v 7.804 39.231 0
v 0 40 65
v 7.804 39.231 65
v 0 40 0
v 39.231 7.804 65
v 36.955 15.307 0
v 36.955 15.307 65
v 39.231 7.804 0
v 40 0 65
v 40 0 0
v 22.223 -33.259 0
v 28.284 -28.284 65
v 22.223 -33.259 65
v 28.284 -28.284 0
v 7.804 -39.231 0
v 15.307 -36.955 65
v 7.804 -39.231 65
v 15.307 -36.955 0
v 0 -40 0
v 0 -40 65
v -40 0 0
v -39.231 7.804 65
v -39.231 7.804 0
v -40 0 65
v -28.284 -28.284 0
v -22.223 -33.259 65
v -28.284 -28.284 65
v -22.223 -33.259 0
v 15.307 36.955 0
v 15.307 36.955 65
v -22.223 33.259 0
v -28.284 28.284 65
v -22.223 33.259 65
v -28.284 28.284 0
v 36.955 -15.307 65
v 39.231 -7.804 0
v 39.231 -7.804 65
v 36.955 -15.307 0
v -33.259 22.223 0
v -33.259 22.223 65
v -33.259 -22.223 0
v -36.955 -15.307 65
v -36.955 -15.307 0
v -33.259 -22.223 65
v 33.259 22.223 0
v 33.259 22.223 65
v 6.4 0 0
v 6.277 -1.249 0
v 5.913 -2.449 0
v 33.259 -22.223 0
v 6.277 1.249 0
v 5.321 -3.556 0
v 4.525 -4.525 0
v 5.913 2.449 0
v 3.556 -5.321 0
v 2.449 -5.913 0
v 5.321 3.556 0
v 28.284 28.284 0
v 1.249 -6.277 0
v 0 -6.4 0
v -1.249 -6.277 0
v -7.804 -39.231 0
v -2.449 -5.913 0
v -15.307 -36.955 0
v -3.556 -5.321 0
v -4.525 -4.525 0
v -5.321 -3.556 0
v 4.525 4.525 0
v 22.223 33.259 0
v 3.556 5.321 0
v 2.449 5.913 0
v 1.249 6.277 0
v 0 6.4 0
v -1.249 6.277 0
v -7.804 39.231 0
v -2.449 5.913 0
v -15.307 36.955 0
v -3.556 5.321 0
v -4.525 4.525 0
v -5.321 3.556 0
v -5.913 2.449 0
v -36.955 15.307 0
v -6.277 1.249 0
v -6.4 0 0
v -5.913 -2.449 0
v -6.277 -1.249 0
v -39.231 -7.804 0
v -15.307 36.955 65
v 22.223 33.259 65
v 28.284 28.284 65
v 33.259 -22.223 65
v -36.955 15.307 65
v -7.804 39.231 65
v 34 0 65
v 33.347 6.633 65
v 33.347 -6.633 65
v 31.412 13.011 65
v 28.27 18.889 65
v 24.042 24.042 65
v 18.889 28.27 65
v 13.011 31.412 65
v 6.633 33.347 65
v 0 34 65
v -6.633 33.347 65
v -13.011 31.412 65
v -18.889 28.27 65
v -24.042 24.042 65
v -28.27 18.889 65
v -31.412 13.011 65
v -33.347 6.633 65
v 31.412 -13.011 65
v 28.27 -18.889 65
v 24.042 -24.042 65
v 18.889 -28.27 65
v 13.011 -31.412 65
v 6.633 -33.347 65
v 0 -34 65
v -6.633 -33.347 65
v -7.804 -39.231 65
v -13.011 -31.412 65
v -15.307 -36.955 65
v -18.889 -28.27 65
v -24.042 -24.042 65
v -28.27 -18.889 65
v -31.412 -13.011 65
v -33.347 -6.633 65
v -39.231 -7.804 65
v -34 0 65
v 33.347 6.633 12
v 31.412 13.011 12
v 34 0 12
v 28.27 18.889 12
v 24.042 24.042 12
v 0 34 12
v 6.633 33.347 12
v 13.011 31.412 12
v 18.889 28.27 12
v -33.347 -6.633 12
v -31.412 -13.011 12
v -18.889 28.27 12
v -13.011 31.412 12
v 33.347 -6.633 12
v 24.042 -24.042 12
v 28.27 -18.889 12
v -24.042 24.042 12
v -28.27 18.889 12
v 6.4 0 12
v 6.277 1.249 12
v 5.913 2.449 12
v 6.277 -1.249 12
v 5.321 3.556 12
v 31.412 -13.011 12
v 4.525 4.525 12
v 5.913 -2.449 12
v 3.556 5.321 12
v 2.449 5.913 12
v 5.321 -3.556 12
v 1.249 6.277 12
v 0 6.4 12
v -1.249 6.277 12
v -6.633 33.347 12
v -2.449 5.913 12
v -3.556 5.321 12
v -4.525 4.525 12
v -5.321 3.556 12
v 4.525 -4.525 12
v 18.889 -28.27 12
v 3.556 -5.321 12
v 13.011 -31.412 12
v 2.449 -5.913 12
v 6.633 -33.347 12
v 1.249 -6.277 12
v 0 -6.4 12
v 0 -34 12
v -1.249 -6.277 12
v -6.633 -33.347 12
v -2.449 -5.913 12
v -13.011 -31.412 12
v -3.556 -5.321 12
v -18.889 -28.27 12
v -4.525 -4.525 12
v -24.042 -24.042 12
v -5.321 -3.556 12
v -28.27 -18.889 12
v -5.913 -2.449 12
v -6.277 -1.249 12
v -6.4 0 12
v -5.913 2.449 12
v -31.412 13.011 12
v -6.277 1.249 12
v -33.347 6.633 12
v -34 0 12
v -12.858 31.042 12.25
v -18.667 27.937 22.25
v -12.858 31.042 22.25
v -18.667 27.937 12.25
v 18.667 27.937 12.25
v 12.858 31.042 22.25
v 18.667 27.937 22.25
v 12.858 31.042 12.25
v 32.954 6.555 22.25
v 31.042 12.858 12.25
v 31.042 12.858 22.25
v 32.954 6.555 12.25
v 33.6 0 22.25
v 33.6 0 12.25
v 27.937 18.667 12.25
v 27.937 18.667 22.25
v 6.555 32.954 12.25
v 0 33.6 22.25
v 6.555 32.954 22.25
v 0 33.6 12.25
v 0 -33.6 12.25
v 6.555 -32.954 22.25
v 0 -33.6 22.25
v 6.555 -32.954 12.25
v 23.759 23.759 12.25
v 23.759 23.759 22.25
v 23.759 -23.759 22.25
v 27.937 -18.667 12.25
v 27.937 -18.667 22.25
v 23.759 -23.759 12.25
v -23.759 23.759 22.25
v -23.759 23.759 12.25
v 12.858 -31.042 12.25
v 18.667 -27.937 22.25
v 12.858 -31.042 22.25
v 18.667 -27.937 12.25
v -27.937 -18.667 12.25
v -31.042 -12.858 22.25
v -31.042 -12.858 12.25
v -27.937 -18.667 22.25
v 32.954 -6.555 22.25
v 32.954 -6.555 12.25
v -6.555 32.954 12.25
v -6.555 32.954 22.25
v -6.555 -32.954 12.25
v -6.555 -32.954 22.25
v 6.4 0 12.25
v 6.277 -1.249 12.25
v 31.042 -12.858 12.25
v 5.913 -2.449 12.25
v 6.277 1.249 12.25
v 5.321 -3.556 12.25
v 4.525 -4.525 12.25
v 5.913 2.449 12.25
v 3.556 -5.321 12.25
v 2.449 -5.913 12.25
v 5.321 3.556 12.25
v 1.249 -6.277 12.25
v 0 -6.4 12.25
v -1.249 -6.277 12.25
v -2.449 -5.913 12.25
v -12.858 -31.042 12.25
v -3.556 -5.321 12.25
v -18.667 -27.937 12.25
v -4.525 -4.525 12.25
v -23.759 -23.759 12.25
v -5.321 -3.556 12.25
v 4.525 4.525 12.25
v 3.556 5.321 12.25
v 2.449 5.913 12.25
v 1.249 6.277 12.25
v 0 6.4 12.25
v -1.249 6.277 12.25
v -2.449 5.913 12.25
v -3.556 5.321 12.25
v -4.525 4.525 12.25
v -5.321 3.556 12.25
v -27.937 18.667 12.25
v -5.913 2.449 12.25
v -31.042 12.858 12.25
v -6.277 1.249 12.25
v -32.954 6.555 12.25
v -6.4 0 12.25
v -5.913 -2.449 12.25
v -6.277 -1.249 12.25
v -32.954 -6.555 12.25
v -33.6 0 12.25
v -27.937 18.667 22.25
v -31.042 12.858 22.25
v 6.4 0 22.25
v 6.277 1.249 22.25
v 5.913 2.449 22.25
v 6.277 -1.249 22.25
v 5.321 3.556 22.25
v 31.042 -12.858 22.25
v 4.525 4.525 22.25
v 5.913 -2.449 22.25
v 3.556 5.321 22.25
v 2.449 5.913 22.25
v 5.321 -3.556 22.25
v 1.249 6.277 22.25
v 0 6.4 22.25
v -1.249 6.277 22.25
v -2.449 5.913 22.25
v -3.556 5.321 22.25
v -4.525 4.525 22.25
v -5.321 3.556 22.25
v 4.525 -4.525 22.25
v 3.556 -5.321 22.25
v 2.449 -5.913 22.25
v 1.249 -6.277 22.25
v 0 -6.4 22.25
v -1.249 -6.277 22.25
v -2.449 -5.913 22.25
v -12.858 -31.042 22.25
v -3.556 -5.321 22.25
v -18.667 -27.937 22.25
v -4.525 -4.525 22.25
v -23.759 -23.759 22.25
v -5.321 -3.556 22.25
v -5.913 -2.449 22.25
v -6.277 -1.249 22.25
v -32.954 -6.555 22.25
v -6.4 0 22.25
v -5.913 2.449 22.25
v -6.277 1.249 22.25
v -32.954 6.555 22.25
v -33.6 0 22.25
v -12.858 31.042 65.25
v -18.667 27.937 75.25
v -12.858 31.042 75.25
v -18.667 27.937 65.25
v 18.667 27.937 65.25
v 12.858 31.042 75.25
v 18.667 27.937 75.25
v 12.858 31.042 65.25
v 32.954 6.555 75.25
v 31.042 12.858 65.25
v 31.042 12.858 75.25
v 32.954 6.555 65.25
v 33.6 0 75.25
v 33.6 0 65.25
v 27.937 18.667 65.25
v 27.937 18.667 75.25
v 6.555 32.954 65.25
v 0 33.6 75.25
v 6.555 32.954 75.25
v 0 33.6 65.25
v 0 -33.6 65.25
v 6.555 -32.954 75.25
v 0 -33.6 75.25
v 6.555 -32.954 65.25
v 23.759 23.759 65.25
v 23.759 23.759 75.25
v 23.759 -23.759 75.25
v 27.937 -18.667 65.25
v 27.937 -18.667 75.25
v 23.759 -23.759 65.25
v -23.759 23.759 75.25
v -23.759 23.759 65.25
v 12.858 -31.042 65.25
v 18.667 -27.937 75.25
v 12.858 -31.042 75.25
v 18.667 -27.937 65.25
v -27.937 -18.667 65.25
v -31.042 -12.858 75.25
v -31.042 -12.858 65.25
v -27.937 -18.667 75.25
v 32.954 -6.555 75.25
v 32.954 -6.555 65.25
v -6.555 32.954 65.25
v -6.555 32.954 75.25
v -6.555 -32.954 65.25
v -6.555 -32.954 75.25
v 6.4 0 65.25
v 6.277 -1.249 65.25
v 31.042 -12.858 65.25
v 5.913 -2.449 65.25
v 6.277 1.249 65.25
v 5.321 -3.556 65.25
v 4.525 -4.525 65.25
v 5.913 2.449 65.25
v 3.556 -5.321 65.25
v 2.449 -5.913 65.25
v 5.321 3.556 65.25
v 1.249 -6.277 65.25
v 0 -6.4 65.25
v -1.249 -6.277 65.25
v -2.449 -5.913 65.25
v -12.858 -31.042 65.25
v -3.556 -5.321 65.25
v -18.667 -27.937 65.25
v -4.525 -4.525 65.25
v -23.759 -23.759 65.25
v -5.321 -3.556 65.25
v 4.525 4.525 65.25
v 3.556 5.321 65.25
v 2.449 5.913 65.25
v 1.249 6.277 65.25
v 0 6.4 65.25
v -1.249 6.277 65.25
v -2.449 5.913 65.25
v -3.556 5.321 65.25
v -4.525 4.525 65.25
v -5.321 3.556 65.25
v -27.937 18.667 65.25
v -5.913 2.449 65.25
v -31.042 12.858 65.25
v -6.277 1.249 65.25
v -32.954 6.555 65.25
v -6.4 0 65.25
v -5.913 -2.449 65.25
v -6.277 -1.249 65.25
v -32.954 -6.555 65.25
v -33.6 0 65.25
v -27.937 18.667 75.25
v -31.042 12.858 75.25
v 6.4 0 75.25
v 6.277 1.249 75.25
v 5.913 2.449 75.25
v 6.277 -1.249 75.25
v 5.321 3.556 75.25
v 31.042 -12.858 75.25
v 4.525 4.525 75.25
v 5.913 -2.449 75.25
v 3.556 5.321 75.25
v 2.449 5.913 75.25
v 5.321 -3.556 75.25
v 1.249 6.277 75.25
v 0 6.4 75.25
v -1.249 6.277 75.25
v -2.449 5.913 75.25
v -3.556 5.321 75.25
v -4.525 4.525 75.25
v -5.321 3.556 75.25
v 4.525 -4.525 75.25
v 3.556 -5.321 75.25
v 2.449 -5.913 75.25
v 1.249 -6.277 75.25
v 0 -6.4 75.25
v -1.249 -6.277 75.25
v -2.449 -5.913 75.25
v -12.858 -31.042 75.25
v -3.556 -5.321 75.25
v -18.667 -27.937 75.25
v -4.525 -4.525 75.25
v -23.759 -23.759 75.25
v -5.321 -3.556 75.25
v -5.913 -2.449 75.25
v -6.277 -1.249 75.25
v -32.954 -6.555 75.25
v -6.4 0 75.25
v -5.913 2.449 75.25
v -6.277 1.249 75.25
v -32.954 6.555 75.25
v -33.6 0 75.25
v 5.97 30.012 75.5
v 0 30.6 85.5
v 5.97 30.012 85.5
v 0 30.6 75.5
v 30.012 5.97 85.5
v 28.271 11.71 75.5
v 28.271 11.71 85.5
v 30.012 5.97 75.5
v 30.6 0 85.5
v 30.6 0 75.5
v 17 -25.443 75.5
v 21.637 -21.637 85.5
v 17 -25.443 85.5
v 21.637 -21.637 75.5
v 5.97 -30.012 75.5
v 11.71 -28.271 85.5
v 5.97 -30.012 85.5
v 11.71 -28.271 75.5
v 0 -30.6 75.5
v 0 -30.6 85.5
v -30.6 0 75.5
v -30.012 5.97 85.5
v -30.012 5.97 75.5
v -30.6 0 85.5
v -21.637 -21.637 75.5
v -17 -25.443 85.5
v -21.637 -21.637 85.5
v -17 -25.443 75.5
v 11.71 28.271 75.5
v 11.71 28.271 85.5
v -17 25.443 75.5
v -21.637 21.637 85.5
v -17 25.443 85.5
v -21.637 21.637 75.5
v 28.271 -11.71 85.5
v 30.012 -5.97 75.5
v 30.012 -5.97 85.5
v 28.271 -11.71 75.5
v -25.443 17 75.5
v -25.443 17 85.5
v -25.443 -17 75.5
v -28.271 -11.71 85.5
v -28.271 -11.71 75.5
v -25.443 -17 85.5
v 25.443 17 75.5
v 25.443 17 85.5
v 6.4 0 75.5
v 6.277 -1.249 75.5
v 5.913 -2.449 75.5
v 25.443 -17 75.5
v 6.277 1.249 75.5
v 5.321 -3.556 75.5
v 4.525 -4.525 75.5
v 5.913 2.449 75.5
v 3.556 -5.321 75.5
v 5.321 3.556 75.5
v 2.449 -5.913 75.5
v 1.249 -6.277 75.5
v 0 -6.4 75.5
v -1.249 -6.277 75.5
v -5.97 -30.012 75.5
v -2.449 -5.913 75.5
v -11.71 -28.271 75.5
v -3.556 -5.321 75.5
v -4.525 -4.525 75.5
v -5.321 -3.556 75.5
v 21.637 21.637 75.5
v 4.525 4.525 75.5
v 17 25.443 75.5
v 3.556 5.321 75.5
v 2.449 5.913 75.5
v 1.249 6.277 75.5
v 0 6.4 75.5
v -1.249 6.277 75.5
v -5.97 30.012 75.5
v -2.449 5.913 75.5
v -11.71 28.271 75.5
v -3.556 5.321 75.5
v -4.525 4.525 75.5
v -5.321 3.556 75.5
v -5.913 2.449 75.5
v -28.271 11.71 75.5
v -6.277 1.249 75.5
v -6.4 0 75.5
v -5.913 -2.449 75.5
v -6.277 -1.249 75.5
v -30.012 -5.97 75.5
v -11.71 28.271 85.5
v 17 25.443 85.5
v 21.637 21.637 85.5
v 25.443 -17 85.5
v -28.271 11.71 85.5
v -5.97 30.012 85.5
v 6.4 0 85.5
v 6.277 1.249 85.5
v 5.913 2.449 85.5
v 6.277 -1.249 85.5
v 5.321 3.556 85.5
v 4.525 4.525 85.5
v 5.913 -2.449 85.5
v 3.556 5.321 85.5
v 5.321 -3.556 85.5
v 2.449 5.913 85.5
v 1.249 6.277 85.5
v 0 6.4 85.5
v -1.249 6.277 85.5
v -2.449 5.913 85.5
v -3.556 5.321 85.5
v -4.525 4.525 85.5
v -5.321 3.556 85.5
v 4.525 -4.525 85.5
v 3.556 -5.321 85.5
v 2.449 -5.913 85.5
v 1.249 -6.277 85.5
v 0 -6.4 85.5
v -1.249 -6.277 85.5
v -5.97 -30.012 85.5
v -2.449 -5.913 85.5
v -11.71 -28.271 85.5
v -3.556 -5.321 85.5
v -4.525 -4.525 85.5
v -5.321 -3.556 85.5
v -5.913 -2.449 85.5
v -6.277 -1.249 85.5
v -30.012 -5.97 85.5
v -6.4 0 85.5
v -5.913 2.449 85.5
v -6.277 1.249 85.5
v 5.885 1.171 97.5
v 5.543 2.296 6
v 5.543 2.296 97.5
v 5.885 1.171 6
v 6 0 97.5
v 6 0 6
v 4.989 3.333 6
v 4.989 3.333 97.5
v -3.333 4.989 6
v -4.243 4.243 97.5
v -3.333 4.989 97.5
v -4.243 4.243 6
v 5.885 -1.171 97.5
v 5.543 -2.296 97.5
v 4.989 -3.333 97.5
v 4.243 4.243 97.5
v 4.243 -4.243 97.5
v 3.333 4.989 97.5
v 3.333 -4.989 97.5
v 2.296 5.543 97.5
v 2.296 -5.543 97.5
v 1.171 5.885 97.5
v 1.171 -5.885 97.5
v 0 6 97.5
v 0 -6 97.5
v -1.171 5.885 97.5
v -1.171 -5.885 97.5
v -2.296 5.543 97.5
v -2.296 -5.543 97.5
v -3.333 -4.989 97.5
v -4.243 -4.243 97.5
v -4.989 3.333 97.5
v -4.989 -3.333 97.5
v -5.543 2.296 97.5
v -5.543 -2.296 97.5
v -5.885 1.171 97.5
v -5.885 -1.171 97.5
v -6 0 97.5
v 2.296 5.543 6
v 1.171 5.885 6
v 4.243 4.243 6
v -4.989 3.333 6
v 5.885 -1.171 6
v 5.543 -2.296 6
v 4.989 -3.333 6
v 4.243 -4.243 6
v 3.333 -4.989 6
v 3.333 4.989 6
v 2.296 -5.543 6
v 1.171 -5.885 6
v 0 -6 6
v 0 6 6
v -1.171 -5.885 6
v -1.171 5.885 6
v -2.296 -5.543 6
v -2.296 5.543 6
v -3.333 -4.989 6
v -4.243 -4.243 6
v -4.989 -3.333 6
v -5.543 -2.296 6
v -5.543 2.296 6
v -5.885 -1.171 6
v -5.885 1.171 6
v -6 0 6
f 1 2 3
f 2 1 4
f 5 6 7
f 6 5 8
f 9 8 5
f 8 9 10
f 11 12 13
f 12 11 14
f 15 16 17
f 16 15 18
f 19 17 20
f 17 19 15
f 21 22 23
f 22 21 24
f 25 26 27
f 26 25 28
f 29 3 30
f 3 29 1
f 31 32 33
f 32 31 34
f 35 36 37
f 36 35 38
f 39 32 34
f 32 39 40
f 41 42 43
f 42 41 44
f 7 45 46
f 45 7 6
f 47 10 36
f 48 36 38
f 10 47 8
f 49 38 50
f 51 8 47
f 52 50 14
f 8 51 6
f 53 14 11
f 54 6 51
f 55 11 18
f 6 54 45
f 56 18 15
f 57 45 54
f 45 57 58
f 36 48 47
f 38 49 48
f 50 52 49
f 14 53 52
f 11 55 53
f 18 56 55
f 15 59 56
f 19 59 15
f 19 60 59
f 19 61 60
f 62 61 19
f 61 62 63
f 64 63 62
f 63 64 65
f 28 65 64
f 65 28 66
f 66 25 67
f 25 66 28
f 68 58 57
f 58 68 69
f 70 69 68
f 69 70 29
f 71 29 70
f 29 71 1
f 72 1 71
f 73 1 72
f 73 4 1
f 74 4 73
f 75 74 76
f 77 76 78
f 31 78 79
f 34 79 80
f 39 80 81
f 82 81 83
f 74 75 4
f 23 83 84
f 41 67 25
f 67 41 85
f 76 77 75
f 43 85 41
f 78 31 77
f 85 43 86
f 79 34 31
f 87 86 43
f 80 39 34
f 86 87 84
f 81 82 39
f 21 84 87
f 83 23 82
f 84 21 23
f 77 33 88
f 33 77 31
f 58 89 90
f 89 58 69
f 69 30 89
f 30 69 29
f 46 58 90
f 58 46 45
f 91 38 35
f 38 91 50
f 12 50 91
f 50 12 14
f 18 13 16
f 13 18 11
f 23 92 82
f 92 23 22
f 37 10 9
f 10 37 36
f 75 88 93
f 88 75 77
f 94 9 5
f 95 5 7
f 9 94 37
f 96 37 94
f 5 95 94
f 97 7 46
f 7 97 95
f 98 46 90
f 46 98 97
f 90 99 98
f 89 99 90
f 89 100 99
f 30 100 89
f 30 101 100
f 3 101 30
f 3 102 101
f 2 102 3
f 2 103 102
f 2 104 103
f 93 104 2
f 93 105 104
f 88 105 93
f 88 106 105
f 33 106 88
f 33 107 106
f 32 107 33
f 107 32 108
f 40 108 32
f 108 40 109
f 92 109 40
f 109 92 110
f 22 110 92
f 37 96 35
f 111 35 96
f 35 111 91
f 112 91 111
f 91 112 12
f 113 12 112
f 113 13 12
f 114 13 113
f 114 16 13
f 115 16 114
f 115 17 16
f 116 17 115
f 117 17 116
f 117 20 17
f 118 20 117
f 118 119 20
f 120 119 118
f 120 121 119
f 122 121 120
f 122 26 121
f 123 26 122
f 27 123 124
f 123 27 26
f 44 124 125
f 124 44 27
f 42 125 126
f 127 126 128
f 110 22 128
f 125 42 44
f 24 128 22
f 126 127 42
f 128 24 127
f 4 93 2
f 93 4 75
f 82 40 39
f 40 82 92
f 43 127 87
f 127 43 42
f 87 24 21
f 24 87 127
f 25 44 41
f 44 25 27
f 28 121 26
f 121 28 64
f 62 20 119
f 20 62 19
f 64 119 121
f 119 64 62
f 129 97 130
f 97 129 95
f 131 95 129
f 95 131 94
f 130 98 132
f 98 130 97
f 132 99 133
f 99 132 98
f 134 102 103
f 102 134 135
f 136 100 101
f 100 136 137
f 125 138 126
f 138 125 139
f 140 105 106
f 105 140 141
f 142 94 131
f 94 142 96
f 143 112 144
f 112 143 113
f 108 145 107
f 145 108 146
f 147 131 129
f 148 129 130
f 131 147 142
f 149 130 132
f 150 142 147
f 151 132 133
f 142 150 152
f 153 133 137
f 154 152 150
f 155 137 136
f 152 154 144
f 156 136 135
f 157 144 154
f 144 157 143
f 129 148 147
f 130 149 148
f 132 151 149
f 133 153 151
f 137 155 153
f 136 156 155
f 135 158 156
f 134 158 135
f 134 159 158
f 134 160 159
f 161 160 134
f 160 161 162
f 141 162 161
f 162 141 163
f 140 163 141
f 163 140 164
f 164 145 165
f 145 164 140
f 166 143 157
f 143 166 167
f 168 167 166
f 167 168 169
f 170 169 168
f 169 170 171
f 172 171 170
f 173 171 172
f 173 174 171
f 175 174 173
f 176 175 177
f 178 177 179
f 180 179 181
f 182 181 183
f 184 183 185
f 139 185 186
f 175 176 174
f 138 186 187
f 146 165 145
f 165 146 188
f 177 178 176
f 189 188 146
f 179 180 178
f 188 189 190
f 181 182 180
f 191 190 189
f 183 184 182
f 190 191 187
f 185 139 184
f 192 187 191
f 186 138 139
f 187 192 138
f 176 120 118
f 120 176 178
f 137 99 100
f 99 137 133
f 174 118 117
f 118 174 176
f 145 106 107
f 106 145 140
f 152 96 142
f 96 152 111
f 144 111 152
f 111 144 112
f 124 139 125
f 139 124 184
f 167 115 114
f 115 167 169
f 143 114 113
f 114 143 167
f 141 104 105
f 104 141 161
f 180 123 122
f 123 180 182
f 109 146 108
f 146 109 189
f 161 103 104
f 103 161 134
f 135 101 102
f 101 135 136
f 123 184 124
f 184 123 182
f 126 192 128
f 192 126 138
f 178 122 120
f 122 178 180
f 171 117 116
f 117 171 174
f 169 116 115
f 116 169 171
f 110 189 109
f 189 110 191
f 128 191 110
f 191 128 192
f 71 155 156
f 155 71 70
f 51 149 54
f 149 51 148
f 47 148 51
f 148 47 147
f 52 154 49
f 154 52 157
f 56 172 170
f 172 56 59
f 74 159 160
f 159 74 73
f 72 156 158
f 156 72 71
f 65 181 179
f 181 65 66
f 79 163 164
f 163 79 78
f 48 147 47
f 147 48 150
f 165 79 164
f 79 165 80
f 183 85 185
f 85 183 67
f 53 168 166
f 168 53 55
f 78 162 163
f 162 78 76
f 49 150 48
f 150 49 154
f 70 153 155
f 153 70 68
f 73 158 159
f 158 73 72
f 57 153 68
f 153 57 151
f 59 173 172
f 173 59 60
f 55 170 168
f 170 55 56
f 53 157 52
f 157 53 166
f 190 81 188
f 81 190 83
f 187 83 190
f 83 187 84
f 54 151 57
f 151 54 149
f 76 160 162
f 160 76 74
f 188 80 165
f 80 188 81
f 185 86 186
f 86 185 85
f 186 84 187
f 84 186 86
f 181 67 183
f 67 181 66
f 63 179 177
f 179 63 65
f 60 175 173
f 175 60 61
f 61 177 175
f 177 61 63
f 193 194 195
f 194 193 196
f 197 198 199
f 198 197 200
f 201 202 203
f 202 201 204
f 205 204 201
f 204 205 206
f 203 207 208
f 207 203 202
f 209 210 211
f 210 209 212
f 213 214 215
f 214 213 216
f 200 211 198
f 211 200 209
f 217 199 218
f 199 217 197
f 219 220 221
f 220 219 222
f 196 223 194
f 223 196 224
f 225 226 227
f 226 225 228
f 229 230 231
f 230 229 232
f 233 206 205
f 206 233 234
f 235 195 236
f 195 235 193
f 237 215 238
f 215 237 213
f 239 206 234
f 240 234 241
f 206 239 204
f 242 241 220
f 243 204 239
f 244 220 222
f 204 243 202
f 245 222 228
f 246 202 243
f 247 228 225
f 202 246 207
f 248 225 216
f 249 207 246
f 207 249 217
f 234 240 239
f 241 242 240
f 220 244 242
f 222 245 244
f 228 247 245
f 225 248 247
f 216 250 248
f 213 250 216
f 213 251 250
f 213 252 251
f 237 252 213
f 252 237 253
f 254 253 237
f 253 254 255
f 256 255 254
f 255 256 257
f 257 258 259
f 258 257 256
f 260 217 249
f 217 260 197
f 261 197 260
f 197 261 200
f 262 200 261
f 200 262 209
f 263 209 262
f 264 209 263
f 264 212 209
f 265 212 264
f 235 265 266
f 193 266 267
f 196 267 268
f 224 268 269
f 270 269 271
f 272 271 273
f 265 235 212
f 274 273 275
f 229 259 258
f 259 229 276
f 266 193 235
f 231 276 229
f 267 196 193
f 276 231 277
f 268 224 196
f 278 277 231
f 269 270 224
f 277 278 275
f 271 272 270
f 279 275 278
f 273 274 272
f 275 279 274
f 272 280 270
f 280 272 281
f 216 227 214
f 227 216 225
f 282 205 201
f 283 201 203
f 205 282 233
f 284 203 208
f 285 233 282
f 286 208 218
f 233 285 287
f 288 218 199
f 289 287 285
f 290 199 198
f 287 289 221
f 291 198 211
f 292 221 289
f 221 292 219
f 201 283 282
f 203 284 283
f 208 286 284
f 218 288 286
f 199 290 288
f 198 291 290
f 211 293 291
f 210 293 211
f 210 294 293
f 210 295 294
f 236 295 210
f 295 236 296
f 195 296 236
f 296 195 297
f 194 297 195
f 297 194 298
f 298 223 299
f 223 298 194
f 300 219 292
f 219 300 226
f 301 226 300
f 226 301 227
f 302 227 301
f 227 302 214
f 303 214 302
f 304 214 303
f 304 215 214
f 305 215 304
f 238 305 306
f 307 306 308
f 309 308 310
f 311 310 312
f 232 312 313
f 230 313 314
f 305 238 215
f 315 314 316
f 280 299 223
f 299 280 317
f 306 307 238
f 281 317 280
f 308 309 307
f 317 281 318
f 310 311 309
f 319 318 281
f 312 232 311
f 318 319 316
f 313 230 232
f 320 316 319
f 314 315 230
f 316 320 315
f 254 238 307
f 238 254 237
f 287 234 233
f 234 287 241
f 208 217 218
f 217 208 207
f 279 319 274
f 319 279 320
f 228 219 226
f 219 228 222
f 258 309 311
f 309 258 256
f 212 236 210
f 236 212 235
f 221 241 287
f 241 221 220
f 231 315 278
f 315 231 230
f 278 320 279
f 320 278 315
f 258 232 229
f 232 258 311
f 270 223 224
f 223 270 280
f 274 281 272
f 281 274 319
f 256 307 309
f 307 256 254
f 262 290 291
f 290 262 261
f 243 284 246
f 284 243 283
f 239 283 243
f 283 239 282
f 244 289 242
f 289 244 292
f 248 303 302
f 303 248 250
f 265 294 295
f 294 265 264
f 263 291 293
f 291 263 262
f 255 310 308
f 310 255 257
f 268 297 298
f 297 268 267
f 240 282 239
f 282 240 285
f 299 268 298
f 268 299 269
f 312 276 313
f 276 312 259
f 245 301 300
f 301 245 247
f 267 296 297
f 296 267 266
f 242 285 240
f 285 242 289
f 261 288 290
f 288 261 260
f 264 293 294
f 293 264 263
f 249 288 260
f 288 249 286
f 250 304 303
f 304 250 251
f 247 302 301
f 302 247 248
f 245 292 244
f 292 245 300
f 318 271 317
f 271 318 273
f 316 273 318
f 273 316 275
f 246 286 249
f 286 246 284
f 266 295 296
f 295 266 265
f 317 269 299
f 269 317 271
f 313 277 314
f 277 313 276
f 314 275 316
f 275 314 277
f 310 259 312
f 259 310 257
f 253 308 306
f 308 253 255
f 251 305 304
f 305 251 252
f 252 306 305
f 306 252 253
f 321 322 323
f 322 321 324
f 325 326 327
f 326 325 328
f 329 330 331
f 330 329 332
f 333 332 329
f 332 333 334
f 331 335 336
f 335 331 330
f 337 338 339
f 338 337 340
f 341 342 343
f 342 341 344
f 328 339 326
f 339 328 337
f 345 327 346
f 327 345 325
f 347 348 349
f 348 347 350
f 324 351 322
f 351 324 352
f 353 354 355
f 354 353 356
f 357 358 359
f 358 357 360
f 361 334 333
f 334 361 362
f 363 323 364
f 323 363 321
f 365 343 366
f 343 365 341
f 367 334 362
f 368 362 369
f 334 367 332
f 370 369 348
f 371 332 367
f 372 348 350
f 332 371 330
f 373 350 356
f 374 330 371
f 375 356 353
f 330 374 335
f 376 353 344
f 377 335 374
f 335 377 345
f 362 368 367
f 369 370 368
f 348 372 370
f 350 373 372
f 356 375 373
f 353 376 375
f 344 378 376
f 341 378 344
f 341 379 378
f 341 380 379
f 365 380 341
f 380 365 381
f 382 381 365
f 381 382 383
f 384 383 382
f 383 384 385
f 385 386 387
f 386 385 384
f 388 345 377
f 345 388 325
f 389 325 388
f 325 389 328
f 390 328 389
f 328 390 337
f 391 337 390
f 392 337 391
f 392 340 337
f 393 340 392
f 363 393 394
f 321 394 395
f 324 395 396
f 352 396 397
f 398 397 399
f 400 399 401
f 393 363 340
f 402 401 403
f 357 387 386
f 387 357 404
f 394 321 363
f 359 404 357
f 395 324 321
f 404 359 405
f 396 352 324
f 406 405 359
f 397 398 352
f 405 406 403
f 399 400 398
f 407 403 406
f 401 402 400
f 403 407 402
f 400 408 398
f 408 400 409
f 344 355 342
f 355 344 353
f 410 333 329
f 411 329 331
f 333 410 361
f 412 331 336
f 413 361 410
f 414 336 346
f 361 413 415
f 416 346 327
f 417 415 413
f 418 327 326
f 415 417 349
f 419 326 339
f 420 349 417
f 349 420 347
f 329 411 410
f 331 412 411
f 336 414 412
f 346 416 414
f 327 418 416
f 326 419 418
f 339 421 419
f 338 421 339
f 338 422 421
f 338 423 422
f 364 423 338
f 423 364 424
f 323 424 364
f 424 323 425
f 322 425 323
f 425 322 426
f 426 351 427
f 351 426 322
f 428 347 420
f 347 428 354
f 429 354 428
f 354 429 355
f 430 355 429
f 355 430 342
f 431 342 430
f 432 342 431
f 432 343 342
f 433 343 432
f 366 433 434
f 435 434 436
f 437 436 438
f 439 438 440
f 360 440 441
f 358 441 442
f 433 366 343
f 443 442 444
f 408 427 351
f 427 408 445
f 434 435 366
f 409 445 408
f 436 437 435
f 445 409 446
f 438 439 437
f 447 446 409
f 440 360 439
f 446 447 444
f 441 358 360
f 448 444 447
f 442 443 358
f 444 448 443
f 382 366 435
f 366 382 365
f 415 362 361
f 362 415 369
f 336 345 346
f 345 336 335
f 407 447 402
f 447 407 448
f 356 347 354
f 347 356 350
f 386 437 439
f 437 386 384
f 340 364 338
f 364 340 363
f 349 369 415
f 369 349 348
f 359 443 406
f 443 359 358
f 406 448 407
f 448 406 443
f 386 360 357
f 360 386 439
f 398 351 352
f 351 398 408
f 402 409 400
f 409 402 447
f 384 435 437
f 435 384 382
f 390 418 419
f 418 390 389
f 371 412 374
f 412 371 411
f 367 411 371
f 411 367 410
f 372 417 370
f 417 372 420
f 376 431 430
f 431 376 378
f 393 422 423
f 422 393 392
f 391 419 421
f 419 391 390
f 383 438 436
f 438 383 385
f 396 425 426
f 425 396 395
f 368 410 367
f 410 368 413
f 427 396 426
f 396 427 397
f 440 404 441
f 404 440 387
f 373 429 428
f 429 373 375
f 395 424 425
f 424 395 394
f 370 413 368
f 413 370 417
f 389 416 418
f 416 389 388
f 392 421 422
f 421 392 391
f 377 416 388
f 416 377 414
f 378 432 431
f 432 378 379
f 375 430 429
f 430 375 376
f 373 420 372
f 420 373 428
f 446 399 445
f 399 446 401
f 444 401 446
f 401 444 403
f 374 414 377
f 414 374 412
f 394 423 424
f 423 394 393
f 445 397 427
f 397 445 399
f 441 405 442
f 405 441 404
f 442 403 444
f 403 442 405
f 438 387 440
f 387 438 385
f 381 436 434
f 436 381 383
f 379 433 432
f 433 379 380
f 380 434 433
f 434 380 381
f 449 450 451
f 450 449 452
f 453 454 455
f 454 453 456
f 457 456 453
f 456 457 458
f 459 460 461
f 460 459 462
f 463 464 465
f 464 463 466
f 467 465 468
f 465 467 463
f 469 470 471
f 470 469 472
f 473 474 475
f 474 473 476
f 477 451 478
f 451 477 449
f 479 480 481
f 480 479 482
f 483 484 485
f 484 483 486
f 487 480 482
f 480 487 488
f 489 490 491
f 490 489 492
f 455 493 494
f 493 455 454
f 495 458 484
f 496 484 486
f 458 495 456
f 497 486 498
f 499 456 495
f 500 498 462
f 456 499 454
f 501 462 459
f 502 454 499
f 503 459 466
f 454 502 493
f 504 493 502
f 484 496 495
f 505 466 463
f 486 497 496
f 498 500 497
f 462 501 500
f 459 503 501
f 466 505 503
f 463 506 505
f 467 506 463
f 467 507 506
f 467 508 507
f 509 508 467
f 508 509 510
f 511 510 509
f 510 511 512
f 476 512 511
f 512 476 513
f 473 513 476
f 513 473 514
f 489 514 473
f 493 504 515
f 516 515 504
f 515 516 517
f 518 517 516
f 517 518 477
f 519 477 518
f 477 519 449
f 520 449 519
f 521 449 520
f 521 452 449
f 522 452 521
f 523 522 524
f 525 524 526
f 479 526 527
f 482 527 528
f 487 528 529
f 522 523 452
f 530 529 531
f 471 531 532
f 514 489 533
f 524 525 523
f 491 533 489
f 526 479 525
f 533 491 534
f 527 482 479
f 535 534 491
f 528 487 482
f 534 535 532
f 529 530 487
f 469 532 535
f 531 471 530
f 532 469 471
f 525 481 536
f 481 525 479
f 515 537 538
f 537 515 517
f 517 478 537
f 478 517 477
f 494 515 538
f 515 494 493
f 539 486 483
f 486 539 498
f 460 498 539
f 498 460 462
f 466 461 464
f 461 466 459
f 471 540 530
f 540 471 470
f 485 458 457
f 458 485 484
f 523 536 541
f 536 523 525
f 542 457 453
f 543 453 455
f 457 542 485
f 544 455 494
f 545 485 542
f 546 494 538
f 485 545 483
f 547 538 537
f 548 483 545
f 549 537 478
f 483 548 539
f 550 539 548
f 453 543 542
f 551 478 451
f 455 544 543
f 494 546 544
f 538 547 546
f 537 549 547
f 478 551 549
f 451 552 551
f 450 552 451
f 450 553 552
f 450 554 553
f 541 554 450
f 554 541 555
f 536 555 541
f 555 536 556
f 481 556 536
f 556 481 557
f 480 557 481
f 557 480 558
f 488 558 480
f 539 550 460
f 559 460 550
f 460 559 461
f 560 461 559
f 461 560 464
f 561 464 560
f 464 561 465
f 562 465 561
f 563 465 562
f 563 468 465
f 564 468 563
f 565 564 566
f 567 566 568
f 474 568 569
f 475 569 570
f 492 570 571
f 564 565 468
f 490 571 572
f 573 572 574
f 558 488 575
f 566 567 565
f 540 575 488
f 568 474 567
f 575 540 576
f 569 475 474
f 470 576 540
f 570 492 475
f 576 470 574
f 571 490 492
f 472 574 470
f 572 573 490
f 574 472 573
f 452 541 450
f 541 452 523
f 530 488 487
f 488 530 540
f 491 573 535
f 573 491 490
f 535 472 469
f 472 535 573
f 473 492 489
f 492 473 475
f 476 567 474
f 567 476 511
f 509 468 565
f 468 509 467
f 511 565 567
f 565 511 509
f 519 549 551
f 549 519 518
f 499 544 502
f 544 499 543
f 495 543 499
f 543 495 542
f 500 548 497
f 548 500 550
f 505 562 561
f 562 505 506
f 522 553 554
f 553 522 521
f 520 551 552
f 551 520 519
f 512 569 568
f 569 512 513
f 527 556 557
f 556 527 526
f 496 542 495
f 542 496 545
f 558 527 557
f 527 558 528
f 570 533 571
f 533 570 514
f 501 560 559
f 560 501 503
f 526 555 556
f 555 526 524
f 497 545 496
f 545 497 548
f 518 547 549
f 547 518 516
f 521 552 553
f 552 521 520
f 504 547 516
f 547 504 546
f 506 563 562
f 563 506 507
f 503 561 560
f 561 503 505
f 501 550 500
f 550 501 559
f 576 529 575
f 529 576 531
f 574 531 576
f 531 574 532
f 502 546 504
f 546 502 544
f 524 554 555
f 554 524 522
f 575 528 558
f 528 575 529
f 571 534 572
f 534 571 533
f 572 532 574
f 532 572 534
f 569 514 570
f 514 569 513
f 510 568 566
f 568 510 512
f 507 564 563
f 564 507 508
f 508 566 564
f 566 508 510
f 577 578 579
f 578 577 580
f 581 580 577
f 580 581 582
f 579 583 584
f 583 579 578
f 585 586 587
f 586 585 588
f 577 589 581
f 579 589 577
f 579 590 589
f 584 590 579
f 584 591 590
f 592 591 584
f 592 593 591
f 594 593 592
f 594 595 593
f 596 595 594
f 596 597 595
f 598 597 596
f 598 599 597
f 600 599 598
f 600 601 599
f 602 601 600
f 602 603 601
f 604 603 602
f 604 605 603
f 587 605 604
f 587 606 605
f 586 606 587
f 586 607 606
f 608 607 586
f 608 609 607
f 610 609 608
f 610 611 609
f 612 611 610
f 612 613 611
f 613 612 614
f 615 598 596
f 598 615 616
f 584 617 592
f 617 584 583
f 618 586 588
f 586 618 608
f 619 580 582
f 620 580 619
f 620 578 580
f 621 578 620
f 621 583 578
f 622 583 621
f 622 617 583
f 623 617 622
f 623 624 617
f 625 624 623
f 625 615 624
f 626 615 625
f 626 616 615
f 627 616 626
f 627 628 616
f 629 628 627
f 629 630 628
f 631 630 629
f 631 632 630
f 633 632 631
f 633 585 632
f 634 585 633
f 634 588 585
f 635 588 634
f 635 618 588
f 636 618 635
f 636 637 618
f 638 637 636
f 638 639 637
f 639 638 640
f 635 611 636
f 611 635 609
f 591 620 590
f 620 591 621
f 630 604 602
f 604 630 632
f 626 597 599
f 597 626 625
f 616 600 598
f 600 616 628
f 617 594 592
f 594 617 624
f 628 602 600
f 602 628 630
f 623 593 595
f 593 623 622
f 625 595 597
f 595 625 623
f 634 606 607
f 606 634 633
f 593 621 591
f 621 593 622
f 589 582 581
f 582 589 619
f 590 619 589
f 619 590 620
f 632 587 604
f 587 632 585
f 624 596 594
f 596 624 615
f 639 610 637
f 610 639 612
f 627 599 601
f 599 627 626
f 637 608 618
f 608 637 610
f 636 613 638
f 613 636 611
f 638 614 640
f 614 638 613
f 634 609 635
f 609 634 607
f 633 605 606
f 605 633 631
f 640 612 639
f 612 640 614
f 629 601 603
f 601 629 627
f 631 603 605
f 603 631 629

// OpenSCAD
$fn = 32;

// ------------------------------------------------------------------------
// Bearing housing: housing d80, two bearings and a shaft
// Every part is its own module, assembly() places them once.
// ------------------------------------------------------------------------

// --- part 1 ---
module housing() {
  difference() {
    cylinder(h = 65, d = 80);
    translate([0, 0, 12]) cylinder(h = 54, d = 68);
    translate([0, 0, -1]) cylinder(h = 14, d = 12.8);
  }
}

// --- part 2 ---
module bearing_lower() {
  difference() {
      translate([0, 0, 0]) cylinder(h = 10, d = 67.2);
      translate([0, 0, -1]) cylinder(h = 12, d = 12.8);
    }
}

// --- part 3 ---
module bearing_upper() {
  difference() {
      translate([0, 0, 0]) cylinder(h = 10, d = 67.2);
      translate([0, 0, -1]) cylinder(h = 12, d = 12.8);
    }
}

// --- part 4 ---
module spacer() {
  difference() {
      translate([0, 0, 0]) cylinder(h = 10, d = 61.2);
      translate([0, 0, -1]) cylinder(h = 12, d = 12.8);
    }
}

// --- part 5 ---
module shaft() {
  translate([0, 0, -45.75]) cylinder(h = 91.5, d = 12);
}

// --- assembly ---
module assembly() {
  translate([0, 0, 0]) rotate([0, 0, 0]) housing();
  translate([0, 0, 12.25]) rotate([0, 0, 0]) bearing_lower();
  translate([0, 0, 65.25]) rotate([0, 0, 0]) bearing_upper();
  translate([0, 0, 75.5]) rotate([0, 0, 0]) spacer();
  translate([0, 0, 51.75]) rotate([0, 0, 0]) shaft();
}

assembly();
